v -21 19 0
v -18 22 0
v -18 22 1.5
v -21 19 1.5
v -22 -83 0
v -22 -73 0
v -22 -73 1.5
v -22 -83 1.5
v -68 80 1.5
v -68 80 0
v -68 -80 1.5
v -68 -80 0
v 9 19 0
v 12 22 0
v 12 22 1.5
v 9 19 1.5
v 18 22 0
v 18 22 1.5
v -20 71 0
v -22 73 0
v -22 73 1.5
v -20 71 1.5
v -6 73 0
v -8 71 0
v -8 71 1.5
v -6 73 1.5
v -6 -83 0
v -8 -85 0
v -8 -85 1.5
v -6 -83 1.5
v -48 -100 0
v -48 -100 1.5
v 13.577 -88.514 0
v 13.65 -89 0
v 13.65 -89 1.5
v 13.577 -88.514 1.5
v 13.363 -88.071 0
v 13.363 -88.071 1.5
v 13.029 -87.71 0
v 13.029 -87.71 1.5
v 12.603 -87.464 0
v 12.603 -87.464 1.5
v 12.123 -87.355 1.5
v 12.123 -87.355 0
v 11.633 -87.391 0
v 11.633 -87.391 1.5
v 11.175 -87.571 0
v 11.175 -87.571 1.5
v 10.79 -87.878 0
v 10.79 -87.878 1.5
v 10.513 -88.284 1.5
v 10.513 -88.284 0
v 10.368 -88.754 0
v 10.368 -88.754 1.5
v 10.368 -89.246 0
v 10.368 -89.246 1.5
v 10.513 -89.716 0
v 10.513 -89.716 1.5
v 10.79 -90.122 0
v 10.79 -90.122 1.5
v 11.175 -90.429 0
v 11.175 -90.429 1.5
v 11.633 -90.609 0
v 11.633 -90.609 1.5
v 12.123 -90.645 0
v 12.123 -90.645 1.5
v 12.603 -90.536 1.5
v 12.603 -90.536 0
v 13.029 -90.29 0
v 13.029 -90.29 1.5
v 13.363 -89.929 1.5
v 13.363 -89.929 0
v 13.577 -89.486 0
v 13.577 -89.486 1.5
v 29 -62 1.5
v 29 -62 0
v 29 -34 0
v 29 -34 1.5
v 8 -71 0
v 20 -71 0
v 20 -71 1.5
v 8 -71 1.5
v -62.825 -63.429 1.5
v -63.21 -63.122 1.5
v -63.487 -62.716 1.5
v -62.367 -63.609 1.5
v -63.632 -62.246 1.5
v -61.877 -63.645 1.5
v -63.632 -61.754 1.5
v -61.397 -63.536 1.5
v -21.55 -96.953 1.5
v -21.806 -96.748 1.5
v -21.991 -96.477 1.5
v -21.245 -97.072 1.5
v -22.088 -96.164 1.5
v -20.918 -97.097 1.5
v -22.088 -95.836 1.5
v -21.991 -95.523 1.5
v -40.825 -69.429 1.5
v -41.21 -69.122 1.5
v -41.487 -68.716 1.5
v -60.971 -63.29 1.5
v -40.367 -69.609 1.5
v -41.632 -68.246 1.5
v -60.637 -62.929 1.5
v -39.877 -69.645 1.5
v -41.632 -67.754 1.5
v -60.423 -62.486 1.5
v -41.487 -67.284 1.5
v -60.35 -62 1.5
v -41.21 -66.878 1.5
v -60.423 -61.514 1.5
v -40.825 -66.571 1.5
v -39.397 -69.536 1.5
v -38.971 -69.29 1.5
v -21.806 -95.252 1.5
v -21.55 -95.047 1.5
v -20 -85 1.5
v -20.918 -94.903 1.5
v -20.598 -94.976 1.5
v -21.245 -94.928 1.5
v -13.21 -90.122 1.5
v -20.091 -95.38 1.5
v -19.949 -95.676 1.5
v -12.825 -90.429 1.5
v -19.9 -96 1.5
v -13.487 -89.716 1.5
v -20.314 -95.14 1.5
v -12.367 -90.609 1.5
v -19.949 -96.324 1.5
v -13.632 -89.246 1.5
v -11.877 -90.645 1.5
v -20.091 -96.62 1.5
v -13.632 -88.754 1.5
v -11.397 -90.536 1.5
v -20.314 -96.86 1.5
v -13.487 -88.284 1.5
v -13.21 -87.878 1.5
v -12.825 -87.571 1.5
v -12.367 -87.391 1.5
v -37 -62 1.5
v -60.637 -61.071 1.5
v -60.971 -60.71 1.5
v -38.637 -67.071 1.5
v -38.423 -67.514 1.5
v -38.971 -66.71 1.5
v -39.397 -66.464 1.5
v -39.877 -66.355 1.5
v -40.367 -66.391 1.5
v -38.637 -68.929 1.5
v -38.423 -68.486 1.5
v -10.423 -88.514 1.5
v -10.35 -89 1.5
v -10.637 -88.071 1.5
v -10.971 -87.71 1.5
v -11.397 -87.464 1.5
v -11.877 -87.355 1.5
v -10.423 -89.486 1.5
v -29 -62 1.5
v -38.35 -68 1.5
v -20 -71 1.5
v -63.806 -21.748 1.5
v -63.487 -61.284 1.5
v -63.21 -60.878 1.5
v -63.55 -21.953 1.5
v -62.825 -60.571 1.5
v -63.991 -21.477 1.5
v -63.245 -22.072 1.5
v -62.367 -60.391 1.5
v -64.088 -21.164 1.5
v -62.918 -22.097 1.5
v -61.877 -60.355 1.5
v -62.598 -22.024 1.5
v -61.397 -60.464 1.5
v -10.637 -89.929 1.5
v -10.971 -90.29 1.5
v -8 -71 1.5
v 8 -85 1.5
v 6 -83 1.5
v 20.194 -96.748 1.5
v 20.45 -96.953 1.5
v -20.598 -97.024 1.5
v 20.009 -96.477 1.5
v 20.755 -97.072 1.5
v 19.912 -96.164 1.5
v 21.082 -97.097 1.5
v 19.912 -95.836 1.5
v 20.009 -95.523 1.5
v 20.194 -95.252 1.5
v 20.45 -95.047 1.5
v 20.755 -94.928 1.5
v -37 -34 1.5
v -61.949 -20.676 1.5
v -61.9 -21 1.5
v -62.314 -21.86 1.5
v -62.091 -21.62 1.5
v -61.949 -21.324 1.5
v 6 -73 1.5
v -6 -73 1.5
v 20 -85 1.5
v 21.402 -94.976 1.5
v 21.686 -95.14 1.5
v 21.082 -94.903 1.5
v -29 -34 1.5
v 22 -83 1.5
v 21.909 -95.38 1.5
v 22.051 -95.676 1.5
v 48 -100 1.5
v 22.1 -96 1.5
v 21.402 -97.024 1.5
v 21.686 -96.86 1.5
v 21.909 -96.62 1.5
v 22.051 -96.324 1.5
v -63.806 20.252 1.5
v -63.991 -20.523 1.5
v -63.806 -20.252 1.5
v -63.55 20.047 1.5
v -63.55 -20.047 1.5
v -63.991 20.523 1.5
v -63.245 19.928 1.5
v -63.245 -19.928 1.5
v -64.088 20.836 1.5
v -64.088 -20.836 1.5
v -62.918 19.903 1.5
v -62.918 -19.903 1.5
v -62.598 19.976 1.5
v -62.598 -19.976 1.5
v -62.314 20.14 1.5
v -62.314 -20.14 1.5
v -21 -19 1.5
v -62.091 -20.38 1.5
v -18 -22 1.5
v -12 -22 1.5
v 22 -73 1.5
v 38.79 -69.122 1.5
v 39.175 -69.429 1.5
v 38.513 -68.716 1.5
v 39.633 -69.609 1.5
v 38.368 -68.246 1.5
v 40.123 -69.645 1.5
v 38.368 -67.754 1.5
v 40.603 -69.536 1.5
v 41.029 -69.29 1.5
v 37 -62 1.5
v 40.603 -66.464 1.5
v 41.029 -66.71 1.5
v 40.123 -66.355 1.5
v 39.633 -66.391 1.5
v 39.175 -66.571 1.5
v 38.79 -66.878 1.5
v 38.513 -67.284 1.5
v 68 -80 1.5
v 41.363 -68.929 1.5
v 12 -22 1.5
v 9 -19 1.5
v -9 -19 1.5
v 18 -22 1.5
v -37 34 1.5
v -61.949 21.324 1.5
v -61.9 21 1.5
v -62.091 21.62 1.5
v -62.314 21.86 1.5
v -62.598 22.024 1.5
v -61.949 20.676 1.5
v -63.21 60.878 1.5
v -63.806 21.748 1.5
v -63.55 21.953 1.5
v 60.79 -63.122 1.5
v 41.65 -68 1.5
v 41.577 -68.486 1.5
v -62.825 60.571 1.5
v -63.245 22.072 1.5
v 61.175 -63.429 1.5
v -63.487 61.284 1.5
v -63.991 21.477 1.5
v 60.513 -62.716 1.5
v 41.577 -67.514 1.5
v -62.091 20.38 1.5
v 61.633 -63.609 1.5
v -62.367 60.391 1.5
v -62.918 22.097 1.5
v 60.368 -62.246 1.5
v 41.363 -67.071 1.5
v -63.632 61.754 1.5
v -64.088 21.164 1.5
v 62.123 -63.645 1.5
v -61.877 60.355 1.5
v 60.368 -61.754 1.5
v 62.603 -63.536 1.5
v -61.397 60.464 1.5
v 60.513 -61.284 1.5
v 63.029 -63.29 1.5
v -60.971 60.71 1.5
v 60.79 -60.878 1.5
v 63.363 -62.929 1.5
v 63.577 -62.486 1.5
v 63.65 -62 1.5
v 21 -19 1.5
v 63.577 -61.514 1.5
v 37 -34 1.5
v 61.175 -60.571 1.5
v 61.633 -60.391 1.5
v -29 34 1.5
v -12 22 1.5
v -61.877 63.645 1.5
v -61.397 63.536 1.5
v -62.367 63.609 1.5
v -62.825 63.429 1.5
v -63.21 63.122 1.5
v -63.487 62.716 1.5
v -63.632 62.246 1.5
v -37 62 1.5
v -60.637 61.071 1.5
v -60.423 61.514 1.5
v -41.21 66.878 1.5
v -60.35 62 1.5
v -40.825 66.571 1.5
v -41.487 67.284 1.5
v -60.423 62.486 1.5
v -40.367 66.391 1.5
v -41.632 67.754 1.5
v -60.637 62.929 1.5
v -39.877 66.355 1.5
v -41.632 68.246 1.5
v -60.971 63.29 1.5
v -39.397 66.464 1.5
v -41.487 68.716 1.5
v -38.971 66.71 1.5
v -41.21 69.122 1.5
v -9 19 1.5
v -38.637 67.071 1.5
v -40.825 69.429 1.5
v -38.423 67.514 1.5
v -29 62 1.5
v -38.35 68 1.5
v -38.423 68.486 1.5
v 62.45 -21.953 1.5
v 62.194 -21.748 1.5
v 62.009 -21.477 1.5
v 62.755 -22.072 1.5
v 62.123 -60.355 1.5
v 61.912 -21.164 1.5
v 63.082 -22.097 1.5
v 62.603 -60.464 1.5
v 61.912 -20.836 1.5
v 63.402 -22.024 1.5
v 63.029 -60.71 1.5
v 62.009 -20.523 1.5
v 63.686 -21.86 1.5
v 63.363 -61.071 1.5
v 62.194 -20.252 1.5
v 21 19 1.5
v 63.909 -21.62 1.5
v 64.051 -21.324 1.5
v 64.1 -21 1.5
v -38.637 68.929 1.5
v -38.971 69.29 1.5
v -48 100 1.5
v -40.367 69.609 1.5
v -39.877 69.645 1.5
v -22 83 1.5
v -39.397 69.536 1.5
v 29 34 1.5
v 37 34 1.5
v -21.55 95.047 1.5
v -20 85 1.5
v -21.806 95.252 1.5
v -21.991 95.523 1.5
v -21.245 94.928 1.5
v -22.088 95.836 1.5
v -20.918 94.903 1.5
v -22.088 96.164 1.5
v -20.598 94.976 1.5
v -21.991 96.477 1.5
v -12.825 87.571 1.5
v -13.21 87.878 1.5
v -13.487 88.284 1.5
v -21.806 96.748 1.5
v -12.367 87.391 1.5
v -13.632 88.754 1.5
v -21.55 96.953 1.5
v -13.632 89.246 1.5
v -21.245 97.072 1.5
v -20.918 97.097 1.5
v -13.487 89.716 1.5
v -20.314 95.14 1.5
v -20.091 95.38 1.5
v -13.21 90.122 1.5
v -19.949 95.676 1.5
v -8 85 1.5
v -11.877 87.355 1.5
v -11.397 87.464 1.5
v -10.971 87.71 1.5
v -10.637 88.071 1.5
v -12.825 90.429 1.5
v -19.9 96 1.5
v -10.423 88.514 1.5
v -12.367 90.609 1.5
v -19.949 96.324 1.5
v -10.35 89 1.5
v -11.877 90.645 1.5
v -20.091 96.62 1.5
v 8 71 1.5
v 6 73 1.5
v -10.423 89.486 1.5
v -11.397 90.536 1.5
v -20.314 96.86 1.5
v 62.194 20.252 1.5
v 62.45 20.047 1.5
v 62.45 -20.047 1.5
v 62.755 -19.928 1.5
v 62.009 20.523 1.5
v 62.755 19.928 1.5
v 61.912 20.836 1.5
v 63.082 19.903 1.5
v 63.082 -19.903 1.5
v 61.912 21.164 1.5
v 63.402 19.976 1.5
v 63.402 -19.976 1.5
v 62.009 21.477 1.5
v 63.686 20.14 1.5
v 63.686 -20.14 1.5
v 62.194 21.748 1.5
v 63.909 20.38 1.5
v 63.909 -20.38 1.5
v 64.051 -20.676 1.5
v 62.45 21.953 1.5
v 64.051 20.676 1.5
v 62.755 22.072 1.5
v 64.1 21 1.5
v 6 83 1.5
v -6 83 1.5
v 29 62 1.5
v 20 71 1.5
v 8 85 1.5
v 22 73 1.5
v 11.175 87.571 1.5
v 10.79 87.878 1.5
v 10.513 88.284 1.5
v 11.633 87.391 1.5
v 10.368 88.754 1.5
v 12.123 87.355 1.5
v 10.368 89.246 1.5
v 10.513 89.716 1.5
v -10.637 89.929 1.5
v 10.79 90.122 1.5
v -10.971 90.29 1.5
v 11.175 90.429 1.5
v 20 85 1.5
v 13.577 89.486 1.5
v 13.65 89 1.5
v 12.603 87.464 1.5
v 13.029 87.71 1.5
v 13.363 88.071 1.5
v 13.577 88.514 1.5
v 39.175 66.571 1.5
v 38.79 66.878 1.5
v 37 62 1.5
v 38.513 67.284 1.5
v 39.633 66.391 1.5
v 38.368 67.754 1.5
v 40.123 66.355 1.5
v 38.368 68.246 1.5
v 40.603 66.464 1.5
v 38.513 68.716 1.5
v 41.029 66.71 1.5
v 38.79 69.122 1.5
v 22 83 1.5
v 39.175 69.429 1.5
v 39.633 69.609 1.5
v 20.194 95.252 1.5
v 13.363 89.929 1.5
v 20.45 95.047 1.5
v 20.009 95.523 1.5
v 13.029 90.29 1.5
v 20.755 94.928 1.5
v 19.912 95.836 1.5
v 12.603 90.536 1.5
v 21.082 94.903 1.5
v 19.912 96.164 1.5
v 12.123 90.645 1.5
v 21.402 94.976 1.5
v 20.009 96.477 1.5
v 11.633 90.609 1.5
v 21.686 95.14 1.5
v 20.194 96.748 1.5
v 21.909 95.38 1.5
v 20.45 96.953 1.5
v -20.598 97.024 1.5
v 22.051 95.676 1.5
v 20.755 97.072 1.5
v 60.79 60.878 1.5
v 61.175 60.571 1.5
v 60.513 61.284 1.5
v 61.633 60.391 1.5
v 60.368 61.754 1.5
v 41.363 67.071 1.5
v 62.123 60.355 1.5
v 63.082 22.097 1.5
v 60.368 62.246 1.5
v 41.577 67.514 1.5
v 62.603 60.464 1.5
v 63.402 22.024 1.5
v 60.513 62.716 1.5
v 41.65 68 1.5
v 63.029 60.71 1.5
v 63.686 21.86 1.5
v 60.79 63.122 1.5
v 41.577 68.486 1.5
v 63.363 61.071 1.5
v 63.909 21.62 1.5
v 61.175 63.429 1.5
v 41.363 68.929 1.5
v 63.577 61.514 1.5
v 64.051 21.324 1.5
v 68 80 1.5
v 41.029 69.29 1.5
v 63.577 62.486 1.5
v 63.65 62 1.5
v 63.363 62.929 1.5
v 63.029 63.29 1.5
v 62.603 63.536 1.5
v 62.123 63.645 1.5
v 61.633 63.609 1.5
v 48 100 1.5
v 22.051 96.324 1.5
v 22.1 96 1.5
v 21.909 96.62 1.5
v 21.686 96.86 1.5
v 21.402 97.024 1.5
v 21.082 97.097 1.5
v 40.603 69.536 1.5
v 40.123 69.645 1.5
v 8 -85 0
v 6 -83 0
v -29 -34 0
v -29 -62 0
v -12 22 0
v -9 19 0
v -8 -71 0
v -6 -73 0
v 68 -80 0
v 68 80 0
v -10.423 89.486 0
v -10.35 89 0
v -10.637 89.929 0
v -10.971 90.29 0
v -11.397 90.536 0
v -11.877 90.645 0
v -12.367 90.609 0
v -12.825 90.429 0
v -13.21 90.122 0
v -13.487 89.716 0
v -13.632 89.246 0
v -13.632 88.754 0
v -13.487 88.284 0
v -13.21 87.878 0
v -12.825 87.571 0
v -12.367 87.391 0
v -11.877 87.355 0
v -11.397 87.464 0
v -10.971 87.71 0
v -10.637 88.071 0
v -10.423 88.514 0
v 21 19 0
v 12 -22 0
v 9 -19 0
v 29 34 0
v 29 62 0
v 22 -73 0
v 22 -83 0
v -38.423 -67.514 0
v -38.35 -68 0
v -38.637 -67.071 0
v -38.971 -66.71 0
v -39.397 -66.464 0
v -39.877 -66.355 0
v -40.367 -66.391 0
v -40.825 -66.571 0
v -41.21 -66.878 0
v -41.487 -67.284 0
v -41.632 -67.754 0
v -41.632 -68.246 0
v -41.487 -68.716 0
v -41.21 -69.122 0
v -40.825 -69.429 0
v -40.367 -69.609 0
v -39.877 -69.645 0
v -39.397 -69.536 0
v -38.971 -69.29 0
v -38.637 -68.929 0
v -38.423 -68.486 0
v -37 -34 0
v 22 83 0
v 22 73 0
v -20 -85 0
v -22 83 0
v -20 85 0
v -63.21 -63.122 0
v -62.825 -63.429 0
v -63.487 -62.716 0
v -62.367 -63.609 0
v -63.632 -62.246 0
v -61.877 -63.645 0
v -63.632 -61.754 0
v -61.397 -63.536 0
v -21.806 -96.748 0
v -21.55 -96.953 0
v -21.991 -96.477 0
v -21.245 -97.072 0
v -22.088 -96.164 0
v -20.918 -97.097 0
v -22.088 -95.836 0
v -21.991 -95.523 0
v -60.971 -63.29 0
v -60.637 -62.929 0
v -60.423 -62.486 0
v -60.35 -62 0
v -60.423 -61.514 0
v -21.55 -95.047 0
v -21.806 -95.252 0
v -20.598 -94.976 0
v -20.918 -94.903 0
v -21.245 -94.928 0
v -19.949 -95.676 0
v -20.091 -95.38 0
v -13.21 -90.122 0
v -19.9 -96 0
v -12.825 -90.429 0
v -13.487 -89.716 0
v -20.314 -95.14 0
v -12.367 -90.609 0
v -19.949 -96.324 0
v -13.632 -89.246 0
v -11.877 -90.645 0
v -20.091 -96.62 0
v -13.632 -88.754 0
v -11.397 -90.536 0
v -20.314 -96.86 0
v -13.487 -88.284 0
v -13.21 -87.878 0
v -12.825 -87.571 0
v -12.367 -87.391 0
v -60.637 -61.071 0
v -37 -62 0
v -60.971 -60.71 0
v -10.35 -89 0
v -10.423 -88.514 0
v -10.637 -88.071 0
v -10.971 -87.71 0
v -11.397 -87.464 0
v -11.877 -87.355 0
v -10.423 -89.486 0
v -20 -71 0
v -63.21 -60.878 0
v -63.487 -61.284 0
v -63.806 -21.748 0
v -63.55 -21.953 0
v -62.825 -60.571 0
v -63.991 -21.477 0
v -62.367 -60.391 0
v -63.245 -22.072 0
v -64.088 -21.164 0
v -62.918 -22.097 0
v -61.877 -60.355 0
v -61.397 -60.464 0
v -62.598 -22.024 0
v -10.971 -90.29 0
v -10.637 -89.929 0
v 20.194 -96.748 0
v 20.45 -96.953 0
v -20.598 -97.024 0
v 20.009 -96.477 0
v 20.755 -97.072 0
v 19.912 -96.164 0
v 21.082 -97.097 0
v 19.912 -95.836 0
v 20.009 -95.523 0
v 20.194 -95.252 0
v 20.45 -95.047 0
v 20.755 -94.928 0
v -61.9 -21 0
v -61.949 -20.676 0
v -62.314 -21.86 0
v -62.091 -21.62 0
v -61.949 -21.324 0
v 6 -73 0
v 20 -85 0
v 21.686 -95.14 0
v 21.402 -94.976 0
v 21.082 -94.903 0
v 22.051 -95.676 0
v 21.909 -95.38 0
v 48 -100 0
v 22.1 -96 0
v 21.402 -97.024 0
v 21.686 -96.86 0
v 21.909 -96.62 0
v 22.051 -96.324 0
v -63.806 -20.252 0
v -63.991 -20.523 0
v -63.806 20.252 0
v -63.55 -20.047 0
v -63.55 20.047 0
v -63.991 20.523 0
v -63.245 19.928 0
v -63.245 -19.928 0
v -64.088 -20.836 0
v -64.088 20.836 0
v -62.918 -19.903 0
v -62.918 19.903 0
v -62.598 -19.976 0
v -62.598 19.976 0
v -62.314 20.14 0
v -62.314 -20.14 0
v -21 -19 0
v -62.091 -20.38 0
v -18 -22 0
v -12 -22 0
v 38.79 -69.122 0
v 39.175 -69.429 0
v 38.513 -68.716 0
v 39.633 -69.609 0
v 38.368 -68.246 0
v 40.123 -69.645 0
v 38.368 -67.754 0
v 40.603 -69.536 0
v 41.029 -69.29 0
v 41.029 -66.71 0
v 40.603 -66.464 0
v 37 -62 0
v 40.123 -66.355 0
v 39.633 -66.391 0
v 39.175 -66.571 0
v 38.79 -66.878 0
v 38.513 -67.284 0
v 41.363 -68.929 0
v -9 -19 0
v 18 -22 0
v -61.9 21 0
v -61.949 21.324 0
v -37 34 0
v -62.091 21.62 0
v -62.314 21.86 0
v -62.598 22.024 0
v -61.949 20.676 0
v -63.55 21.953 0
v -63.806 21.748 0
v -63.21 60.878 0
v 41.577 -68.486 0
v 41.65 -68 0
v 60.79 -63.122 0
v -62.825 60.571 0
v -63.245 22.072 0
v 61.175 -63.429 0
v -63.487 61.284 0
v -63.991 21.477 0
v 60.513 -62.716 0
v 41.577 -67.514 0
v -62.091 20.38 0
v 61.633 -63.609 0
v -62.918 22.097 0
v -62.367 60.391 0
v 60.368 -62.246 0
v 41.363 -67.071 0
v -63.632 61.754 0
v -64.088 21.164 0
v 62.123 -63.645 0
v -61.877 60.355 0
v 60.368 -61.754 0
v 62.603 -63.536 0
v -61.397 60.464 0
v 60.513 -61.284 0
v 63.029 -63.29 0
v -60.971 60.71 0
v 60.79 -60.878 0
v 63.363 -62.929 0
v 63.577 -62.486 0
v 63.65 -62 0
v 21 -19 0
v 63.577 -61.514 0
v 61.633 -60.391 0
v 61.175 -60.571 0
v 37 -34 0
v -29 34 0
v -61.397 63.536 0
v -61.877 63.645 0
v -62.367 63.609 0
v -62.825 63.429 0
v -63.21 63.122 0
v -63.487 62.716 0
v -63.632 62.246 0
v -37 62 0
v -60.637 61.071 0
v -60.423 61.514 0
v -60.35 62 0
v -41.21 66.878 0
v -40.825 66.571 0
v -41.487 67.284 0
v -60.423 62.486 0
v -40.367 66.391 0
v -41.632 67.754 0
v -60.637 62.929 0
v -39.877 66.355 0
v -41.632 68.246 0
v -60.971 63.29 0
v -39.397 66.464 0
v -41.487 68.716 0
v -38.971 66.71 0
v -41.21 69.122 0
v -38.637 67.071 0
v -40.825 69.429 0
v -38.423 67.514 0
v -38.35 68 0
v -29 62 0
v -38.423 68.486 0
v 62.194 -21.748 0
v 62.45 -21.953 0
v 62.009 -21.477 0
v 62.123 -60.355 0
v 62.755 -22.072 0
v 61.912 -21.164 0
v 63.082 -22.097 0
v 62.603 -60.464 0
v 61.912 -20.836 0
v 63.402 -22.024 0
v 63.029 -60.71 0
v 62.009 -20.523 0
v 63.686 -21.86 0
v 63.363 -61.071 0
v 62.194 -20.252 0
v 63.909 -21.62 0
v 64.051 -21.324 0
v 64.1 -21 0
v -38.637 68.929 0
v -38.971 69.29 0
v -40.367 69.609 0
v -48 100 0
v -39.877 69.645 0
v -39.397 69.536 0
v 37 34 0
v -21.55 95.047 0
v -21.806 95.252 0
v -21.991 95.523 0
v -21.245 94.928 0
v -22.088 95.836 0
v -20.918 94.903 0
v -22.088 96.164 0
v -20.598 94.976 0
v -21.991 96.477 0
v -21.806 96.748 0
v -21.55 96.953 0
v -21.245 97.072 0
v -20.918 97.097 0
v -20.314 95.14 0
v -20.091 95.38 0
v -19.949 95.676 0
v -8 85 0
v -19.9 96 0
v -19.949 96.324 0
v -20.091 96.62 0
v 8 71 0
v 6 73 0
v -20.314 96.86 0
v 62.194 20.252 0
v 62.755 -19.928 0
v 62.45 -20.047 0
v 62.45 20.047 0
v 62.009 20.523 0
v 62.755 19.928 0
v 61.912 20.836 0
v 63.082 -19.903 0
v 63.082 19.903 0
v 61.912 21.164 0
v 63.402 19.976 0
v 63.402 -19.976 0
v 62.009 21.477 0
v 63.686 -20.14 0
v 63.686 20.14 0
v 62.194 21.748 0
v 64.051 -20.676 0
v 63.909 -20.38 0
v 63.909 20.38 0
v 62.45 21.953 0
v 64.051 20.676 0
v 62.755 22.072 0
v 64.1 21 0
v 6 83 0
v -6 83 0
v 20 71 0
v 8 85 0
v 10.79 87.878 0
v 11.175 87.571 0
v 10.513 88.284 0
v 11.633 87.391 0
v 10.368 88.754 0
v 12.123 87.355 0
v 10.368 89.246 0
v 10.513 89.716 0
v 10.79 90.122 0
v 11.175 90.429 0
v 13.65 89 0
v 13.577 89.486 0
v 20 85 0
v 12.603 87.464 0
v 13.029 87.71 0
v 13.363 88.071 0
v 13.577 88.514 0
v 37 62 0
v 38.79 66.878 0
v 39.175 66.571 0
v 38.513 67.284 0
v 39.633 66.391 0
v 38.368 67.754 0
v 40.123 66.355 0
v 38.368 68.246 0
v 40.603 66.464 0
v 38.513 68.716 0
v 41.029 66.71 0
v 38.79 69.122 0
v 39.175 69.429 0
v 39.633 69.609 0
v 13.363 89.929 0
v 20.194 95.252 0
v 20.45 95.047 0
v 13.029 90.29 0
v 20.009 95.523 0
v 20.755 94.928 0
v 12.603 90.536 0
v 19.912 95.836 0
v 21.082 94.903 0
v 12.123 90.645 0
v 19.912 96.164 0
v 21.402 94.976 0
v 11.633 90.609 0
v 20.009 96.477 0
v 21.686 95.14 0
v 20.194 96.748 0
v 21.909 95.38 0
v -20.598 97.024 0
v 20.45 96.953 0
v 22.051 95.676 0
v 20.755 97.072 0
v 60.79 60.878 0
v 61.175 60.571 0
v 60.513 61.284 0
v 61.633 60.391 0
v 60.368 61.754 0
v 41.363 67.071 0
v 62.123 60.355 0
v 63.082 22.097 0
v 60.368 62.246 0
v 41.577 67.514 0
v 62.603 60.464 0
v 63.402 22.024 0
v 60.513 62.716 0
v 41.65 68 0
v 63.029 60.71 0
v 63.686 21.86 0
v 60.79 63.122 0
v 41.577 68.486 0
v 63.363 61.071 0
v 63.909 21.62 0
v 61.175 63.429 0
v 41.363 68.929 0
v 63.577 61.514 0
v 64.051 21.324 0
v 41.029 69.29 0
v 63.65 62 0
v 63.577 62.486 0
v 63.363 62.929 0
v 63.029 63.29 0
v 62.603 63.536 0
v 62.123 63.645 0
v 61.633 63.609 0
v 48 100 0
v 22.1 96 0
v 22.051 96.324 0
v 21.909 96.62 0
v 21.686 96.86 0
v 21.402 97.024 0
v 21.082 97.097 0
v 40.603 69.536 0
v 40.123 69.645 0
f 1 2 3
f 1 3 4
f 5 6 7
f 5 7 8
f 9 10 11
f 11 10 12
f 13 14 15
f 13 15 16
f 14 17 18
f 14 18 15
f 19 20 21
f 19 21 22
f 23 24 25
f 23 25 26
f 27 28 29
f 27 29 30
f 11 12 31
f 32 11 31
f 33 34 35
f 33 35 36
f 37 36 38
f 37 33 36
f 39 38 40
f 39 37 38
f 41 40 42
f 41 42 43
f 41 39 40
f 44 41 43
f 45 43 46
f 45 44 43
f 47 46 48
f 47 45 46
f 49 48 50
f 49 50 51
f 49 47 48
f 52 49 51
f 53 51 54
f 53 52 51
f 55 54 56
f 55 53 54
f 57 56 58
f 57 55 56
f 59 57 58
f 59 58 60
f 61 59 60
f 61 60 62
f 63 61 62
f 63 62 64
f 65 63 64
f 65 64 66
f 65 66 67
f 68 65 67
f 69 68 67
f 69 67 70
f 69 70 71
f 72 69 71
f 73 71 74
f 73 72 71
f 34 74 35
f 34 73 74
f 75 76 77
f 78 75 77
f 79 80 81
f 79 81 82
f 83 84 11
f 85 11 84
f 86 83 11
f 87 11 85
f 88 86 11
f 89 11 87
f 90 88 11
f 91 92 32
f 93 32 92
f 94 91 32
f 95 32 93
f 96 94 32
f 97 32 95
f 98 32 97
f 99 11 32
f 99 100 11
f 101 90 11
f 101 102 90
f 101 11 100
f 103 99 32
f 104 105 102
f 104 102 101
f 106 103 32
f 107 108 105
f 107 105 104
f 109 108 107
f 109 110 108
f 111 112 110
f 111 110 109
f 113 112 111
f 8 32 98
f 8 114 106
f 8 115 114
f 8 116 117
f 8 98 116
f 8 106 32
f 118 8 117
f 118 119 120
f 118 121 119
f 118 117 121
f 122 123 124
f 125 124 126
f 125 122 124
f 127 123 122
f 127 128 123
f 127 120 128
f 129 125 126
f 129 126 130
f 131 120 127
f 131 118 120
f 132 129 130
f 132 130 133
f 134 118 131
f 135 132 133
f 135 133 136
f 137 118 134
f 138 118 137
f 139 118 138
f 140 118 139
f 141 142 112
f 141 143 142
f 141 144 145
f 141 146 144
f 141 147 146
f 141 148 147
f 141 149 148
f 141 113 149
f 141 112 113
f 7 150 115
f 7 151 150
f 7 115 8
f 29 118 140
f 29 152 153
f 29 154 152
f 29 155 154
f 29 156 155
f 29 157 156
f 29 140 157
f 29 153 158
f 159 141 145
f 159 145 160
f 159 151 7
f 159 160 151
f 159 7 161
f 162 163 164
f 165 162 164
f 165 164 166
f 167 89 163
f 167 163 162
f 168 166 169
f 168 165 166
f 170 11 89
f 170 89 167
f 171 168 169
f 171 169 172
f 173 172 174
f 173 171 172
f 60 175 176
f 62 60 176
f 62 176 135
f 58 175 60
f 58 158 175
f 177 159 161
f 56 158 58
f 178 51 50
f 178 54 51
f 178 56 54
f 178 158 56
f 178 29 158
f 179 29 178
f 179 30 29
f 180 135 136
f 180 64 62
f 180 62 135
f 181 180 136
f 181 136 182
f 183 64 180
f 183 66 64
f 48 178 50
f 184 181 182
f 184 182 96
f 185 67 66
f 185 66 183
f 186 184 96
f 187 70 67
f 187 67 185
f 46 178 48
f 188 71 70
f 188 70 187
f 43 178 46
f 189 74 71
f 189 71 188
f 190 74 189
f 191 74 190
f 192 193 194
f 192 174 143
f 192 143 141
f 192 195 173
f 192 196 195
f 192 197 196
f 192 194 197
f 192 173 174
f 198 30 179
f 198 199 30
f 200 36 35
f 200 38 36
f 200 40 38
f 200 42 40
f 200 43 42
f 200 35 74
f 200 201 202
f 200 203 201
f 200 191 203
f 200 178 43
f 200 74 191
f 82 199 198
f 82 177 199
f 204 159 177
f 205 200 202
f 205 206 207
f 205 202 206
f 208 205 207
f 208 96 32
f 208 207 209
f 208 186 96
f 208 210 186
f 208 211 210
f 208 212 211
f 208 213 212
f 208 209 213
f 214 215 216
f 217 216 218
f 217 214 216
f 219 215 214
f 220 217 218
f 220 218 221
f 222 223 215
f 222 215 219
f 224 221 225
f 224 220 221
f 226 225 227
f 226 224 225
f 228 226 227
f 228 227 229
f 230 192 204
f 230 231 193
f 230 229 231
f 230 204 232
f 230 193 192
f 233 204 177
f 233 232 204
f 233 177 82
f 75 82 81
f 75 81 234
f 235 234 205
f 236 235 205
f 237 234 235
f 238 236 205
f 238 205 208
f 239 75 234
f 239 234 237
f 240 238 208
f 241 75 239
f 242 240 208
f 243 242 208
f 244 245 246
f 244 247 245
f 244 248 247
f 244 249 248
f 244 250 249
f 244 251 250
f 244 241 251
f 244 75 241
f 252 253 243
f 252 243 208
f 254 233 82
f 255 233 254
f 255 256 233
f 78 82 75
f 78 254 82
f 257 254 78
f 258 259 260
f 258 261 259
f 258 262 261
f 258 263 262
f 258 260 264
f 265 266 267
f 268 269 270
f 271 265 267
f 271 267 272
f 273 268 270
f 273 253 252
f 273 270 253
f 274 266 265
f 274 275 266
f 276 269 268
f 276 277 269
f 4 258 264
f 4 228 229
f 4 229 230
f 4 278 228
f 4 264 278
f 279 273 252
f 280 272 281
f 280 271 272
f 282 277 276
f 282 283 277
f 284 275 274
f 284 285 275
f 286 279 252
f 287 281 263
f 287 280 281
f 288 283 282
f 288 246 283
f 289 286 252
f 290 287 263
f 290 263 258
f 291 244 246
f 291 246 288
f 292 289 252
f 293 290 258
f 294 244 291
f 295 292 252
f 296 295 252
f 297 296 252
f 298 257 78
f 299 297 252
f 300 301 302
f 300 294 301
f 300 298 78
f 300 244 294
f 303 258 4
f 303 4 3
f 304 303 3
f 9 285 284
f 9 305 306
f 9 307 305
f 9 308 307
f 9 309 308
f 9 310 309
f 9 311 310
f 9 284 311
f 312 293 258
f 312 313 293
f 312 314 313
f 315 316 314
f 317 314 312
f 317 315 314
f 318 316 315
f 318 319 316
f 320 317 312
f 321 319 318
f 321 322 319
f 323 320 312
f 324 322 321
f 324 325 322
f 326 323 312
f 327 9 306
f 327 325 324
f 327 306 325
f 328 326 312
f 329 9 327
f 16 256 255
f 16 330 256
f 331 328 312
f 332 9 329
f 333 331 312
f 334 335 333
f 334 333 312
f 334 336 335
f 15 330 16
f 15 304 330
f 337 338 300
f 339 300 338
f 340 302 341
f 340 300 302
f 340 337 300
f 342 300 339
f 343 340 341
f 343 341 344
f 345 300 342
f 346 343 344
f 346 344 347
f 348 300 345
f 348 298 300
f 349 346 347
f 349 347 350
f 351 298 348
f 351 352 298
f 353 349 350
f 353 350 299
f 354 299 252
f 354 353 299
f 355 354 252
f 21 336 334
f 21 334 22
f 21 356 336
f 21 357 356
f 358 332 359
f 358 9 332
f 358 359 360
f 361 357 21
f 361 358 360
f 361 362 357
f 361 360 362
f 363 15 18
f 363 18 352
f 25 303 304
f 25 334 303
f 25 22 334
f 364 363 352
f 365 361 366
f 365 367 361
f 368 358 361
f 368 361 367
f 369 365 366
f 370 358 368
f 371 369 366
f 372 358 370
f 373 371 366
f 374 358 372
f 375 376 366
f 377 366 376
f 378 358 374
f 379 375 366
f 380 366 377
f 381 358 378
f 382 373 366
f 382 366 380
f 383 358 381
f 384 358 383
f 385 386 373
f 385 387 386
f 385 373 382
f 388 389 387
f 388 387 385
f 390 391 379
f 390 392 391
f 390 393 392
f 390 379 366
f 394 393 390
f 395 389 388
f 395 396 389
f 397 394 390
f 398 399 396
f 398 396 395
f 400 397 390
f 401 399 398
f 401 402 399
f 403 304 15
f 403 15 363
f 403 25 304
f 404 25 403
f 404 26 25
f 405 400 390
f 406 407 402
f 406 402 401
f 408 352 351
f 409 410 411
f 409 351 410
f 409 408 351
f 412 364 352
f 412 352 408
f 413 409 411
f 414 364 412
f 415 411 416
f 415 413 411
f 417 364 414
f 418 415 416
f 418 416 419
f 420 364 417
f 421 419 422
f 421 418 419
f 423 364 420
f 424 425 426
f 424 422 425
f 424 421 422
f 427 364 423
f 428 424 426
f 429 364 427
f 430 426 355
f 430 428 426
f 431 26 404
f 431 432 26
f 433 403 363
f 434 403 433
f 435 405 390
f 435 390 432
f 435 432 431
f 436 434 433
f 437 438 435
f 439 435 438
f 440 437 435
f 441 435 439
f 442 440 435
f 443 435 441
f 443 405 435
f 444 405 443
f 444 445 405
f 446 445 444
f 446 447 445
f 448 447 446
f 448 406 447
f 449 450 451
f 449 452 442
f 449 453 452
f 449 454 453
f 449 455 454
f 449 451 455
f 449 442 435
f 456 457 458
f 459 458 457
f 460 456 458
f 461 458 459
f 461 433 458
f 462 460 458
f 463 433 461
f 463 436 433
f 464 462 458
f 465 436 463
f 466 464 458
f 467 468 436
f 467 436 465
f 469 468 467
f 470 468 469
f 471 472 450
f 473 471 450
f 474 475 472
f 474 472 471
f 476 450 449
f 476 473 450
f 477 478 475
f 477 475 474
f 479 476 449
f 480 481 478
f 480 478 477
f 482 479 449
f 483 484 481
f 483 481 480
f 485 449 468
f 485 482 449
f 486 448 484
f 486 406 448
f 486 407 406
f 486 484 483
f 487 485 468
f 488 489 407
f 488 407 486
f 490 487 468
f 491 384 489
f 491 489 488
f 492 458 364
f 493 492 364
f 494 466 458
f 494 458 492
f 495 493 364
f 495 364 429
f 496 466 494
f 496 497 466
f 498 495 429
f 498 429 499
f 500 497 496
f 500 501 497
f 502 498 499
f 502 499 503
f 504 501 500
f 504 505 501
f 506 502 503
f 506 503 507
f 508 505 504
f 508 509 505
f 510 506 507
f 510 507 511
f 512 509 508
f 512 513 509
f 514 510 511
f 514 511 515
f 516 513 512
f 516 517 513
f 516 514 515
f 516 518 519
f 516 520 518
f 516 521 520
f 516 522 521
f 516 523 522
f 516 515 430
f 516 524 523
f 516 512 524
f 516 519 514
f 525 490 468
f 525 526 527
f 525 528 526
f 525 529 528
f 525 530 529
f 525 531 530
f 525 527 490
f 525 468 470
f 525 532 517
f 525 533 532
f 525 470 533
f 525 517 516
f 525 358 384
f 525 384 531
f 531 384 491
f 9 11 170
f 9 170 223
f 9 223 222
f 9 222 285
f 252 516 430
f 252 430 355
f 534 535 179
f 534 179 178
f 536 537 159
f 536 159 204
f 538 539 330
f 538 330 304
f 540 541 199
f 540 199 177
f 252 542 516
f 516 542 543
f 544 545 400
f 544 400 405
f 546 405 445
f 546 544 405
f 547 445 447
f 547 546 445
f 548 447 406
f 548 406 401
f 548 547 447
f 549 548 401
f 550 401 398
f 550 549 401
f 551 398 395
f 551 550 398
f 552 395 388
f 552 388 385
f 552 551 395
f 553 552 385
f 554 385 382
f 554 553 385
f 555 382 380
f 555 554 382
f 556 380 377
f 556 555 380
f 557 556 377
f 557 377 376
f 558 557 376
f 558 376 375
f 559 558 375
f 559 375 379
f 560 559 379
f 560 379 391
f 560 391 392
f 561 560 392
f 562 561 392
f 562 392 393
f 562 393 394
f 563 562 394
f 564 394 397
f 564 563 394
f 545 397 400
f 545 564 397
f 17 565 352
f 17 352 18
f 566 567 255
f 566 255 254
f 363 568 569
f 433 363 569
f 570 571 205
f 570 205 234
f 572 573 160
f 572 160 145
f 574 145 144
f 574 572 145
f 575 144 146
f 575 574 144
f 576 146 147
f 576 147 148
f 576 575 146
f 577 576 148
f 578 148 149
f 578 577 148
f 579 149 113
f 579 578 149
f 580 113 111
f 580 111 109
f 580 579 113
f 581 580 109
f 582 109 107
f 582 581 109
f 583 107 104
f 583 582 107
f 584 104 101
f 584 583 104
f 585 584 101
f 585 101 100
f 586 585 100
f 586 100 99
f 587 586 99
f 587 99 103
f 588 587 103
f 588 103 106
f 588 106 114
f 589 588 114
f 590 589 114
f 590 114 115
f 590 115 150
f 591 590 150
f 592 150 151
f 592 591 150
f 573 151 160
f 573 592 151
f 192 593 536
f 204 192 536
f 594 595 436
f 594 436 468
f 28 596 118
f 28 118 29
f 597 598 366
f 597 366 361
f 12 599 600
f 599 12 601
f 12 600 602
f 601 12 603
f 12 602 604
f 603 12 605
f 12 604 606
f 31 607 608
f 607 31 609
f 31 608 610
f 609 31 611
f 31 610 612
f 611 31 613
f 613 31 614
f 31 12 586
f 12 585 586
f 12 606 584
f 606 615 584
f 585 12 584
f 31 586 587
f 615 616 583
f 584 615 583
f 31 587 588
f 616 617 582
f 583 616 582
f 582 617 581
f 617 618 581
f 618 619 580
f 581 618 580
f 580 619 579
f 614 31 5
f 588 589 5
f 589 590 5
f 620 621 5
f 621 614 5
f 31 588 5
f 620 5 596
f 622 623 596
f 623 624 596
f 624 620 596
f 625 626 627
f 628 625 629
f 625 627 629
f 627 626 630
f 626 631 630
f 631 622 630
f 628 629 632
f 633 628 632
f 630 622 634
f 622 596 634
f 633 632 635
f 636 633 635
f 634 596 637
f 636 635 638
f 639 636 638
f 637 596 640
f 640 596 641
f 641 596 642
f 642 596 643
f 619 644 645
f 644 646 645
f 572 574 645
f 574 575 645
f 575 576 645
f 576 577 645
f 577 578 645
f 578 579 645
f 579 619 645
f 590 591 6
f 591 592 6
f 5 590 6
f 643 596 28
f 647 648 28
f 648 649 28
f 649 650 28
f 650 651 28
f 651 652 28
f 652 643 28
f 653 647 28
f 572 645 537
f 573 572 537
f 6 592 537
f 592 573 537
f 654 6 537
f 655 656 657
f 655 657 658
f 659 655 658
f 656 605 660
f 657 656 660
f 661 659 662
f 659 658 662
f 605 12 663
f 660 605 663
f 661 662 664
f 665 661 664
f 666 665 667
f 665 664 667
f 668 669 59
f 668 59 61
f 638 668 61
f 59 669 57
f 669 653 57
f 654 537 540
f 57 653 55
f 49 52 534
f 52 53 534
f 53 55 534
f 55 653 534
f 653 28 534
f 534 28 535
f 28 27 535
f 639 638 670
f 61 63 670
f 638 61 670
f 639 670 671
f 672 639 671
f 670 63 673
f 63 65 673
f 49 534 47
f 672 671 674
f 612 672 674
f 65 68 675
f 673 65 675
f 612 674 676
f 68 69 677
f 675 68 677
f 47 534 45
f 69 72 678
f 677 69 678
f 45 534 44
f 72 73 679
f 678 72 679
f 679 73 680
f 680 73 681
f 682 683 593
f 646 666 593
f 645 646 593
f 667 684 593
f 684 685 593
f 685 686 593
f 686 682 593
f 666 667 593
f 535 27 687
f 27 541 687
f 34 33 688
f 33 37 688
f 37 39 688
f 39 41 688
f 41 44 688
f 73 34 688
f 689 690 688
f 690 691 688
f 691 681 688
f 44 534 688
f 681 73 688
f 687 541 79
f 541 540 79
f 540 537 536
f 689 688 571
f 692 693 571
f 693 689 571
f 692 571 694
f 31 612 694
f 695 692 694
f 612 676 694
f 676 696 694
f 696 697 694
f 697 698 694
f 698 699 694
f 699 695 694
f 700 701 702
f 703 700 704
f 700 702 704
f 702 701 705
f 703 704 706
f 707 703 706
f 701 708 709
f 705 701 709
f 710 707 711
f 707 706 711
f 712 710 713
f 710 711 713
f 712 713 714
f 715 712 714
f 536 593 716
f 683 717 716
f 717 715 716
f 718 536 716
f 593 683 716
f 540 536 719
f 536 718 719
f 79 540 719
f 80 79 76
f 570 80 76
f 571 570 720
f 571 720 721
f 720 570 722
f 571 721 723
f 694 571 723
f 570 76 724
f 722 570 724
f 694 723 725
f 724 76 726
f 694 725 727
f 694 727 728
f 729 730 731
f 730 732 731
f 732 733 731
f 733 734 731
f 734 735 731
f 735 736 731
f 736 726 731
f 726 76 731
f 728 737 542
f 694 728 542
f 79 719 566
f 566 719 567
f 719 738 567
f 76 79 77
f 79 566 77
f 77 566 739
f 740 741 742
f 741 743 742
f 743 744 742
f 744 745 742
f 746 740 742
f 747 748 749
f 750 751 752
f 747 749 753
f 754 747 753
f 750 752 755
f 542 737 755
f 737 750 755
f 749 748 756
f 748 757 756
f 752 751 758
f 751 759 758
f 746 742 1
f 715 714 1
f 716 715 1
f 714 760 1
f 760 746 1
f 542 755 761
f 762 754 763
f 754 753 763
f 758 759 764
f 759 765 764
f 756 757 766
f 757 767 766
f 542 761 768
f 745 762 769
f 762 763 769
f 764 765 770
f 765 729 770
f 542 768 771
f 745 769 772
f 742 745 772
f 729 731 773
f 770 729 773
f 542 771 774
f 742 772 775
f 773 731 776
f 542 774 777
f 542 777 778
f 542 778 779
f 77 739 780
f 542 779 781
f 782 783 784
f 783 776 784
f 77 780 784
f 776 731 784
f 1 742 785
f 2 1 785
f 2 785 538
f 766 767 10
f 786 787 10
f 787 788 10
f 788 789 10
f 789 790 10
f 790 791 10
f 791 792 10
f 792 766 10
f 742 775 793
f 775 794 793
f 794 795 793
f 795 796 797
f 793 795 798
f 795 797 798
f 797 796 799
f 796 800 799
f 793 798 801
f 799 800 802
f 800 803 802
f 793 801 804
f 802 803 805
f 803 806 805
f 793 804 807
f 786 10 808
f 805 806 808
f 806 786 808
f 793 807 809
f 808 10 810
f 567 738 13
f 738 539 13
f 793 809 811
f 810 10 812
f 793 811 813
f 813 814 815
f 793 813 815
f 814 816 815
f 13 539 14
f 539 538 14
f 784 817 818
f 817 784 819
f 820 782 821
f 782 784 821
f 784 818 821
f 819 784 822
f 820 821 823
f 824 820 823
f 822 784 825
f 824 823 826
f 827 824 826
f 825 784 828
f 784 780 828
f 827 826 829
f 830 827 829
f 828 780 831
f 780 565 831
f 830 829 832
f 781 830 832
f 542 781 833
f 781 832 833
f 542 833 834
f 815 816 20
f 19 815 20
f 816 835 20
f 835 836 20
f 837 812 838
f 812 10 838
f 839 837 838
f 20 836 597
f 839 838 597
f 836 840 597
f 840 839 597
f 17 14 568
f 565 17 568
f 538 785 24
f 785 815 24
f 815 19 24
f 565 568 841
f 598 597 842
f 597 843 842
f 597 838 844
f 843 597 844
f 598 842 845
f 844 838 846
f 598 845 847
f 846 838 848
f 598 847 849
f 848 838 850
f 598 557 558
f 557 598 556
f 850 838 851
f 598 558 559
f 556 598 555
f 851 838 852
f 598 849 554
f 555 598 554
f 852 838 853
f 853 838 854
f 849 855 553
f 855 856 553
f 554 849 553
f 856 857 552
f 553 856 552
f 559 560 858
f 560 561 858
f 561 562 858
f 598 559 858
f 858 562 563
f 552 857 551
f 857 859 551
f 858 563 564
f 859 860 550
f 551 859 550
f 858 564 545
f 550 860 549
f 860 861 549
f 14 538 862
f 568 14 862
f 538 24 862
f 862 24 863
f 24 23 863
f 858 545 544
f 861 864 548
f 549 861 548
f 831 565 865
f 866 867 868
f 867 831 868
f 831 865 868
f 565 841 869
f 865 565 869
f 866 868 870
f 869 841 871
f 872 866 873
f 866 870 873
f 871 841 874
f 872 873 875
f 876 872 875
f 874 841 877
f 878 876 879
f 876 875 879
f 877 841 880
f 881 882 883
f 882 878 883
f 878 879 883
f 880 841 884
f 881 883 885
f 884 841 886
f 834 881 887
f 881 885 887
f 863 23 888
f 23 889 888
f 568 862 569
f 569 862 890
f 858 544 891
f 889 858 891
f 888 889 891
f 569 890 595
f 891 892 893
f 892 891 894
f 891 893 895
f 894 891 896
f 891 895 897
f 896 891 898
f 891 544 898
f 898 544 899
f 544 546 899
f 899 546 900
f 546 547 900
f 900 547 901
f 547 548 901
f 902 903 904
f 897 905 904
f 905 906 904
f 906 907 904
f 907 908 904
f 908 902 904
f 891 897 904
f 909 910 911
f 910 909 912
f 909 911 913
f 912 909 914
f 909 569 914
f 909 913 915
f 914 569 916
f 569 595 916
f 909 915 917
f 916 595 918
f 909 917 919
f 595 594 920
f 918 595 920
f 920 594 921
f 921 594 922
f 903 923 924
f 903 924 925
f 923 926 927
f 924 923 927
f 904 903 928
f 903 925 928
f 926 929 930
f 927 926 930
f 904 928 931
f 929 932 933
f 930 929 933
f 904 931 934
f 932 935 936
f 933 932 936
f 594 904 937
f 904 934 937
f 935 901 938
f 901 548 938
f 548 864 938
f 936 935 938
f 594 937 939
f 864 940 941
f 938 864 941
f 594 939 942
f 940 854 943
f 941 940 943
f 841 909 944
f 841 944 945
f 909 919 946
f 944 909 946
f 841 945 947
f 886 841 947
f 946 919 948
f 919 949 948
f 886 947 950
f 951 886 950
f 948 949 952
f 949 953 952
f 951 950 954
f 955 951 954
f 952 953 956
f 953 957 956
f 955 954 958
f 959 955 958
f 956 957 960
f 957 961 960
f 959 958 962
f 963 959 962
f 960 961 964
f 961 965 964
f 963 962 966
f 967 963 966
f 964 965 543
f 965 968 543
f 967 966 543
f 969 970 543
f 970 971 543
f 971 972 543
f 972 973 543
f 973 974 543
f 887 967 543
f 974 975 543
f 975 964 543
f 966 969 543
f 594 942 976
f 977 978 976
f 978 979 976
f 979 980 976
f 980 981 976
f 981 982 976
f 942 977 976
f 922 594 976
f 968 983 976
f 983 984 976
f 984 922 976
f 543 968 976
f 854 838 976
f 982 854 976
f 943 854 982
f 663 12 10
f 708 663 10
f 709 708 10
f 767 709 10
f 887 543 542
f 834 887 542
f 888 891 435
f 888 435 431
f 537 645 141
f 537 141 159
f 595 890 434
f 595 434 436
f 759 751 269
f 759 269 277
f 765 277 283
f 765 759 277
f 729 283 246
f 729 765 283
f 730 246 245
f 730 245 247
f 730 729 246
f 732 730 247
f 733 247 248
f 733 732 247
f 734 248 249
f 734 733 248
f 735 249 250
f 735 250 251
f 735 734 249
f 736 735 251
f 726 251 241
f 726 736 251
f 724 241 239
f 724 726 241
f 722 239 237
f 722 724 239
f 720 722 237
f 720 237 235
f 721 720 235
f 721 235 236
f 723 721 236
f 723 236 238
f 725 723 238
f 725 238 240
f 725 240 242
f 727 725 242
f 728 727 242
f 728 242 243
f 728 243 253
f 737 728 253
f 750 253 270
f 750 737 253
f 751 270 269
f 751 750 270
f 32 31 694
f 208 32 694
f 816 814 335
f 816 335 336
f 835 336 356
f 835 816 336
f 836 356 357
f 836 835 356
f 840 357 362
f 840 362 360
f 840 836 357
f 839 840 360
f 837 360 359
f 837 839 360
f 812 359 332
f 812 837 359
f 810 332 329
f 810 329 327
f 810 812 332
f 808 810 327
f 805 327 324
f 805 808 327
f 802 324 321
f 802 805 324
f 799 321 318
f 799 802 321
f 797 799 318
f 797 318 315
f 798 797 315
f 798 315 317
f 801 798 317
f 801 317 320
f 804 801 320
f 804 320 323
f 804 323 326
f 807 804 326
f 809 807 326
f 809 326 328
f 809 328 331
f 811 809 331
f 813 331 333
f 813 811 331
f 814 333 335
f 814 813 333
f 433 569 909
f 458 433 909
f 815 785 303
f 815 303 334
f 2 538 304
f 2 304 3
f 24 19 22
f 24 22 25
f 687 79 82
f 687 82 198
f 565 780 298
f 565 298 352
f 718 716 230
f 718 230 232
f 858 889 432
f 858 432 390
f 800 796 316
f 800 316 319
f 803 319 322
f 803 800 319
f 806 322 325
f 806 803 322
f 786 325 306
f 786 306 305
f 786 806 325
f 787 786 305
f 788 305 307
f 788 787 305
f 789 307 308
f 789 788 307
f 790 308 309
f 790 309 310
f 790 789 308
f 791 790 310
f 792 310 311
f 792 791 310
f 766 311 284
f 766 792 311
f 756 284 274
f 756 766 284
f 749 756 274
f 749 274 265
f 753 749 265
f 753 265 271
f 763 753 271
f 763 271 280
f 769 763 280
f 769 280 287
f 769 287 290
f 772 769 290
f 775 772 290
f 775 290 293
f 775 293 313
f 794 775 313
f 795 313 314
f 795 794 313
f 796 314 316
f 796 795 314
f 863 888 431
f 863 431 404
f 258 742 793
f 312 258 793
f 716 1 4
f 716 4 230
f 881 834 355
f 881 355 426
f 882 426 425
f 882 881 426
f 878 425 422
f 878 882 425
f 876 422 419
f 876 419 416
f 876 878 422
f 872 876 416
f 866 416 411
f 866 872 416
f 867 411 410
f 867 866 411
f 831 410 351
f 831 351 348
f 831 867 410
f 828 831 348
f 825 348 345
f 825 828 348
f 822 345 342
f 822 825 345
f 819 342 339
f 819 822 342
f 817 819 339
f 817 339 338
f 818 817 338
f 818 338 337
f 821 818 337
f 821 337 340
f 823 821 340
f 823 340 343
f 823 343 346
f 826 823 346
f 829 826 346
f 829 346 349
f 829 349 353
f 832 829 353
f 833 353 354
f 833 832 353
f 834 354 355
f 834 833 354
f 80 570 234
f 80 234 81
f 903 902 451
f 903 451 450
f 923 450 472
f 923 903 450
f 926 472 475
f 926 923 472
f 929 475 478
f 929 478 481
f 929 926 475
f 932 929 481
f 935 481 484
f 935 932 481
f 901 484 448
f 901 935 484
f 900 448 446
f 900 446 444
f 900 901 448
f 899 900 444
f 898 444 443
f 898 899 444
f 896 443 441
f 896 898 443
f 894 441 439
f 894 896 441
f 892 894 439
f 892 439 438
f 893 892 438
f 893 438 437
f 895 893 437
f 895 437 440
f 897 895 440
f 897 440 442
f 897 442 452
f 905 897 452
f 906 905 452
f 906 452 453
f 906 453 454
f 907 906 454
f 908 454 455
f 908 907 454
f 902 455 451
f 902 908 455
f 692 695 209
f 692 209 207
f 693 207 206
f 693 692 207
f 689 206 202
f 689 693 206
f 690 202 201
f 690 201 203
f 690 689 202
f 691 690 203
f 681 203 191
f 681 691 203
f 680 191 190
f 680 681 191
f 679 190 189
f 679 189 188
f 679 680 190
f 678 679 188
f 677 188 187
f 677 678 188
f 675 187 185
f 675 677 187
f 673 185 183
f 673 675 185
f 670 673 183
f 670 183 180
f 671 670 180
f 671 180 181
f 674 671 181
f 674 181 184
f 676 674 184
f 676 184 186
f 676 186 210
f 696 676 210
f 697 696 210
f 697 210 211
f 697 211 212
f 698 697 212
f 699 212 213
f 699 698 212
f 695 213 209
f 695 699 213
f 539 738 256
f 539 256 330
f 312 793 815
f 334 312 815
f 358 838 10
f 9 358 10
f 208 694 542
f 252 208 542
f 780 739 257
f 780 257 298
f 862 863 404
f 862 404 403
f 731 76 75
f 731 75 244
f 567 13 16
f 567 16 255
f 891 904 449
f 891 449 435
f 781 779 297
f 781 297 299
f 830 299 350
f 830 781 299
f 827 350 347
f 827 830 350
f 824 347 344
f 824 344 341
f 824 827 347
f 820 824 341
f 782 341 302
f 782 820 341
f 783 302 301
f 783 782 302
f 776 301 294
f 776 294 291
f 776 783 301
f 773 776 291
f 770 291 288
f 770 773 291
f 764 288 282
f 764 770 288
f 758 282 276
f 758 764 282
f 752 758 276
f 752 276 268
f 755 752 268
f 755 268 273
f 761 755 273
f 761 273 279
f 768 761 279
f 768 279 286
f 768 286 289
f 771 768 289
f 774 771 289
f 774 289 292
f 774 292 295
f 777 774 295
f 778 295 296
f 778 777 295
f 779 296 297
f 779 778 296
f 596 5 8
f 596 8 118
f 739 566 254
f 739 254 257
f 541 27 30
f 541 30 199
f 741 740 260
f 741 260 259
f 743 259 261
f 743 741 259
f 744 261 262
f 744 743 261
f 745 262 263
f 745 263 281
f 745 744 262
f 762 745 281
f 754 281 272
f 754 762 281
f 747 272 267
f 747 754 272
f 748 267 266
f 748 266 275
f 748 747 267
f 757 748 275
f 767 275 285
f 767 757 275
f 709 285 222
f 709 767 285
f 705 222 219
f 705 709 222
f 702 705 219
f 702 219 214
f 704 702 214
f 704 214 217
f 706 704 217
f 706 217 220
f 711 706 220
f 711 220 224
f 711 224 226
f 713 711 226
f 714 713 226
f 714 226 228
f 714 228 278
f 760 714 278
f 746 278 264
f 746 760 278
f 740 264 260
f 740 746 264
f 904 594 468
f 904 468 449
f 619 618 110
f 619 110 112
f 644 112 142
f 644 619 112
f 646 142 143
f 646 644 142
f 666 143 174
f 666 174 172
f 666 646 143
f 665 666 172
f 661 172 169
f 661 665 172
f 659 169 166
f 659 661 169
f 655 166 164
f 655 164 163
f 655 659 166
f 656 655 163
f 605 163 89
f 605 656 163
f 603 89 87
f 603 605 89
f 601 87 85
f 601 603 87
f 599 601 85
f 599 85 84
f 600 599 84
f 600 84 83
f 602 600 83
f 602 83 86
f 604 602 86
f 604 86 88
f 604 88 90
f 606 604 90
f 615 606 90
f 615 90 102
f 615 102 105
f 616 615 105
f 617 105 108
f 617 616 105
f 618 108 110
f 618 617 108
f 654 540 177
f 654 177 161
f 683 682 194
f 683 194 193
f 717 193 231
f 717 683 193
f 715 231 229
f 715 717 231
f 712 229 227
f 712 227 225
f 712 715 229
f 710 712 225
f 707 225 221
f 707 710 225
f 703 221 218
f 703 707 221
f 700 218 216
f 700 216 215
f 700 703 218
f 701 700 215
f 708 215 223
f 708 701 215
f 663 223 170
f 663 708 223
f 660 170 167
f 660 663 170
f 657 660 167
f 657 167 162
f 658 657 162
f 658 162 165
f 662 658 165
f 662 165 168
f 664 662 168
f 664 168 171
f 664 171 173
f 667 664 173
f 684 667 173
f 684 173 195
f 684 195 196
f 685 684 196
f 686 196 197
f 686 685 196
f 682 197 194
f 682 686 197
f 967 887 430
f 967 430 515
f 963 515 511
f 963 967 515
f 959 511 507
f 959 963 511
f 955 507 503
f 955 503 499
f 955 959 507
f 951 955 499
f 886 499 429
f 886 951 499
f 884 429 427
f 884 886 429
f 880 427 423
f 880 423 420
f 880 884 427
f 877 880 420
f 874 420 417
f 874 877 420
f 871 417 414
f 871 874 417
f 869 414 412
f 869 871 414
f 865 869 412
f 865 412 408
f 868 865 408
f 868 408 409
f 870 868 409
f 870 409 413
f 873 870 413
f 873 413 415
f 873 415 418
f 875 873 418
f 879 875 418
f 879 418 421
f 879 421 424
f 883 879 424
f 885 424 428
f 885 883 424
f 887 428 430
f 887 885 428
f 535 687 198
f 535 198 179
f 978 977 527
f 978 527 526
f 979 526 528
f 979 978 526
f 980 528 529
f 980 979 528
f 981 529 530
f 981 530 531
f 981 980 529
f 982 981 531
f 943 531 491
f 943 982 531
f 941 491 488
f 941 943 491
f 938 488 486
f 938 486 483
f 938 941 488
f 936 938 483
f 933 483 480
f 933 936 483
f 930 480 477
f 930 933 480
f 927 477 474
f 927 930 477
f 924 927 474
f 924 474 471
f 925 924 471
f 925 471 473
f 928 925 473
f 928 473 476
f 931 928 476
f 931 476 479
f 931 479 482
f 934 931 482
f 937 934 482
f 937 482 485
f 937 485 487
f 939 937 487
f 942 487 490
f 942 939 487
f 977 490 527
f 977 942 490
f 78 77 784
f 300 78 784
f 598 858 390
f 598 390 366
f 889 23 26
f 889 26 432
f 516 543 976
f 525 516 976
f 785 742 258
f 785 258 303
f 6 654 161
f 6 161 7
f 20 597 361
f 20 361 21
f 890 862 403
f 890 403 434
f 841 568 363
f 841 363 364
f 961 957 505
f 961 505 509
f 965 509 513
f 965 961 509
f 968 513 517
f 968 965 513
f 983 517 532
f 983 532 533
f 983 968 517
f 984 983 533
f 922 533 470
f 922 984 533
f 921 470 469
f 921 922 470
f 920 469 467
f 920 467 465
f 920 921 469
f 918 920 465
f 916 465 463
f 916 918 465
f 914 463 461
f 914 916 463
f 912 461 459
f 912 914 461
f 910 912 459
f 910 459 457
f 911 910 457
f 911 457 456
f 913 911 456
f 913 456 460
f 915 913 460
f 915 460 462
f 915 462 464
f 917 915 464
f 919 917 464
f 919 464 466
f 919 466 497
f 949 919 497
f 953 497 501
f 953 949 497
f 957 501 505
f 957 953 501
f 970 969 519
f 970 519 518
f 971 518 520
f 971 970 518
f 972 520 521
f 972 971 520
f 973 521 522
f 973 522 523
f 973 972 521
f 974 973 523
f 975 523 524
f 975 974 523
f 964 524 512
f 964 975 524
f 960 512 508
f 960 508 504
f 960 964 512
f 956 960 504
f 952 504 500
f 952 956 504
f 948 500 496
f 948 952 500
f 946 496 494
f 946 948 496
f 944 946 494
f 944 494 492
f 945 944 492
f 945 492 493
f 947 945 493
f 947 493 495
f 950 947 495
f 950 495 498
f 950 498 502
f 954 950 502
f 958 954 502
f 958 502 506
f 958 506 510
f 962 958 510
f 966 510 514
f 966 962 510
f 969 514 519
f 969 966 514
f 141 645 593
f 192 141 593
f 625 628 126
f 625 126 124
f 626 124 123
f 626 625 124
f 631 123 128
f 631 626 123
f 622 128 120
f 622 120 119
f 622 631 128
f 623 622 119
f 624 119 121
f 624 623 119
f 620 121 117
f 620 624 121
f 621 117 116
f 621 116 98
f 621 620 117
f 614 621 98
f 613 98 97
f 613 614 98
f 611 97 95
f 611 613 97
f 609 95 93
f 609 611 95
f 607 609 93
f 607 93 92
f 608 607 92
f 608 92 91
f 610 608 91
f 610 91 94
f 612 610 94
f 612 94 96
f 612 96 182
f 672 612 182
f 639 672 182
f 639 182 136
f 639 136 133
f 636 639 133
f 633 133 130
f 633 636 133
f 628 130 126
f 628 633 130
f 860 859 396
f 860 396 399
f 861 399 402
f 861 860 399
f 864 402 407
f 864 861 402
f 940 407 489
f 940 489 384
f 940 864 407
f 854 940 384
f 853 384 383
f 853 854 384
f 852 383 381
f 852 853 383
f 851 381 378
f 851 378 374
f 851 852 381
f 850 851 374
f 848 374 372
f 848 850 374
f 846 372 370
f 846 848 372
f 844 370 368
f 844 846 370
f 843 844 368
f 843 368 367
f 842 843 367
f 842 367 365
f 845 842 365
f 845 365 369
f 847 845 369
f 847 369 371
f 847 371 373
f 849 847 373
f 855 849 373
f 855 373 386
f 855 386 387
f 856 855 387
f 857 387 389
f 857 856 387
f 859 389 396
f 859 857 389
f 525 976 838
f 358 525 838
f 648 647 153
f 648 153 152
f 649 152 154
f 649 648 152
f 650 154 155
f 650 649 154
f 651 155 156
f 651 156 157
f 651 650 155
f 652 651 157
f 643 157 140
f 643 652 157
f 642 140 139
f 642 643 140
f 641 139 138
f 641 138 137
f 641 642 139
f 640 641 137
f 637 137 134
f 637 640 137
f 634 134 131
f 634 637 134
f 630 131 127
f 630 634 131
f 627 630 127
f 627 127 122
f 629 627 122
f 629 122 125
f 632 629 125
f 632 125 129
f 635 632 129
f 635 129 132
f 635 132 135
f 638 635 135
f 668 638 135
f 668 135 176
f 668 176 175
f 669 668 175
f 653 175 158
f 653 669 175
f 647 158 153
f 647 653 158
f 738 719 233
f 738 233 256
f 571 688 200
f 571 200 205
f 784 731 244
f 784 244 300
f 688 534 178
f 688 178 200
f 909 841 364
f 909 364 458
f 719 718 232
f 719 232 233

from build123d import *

# Parameters (mm, degrees)
SKETCH_1_R            = 1.65
SKETCH_1_W            = 8
SKETCH_1_H            = 28
EXTRUDE_401_DEPTH     = 1.5
SKETCH_3_R            = 1.1
CUT_EXTRUDE_482_DEPTH = 1.5


with BuildPart() as part:
    # 草图1 → Extrude 401 (new body)
    with BuildSketch(Plane.XY):
        Polygon((68, 80), (48, 100), (-48, 100), (-68, 80), (-68, -80), (-48, -100), (48, -100), (68, -80), align=None)
        with Locations((-62, -62)):
            Circle(SKETCH_1_R, mode=Mode.SUBTRACT)
        with Locations((-40, -68)):
            Circle(SKETCH_1_R, mode=Mode.SUBTRACT)
        with Locations((-12, -89)):
            Circle(SKETCH_1_R, mode=Mode.SUBTRACT)
        with Locations((-62, 62)):
            Circle(SKETCH_1_R, mode=Mode.SUBTRACT)
        with Locations((-40, 68)):
            Circle(SKETCH_1_R, mode=Mode.SUBTRACT)
        with Locations((-12, 89)):
            Circle(SKETCH_1_R, mode=Mode.SUBTRACT)
        with Locations((62, -62)):
            Circle(SKETCH_1_R, mode=Mode.SUBTRACT)
        with Locations((40, -68)):
            Circle(SKETCH_1_R, mode=Mode.SUBTRACT)
        with Locations((12, -89)):
            Circle(SKETCH_1_R, mode=Mode.SUBTRACT)
        with Locations((62, 62)):
            Circle(SKETCH_1_R, mode=Mode.SUBTRACT)
        with Locations((40, 68)):
            Circle(SKETCH_1_R, mode=Mode.SUBTRACT)
        with Locations((12, 89)):
            Circle(SKETCH_1_R, mode=Mode.SUBTRACT)
        with Locations((-33, -48)):
            Rectangle(SKETCH_1_W, SKETCH_1_H, mode=Mode.SUBTRACT)
        Polygon((-20, -85), (-8, -85), (-6, -83), (-6, -73), (-8, -71), (-20, -71), (-22, -73), (-22, -83), align=None, mode=Mode.SUBTRACT)
        with Locations((-33, 48)):
            Rectangle(SKETCH_1_W, SKETCH_1_H, mode=Mode.SUBTRACT)
        Polygon((-20, 71), (-8, 71), (-6, 73), (-6, 83), (-8, 85), (-20, 85), (-22, 83), (-22, 73), align=None, mode=Mode.SUBTRACT)
        with Locations((33, -48)):
            Rectangle(SKETCH_1_W, SKETCH_1_H, mode=Mode.SUBTRACT)
        Polygon((8, -85), (20, -85), (22, -83), (22, -73), (20, -71), (8, -71), (6, -73), (6, -83), align=None, mode=Mode.SUBTRACT)
        with Locations((33, 48)):
            Rectangle(SKETCH_1_W, SKETCH_1_H, mode=Mode.SUBTRACT)
        Polygon((8, 71), (20, 71), (22, 73), (22, 83), (20, 85), (8, 85), (6, 83), (6, 73), align=None, mode=Mode.SUBTRACT)
        Polygon((-18, -22), (-12, -22), (-9, -19), (-9, 19), (-12, 22), (-18, 22), (-21, 19), (-21, -19), align=None, mode=Mode.SUBTRACT)
        Polygon((12, -22), (18, -22), (21, -19), (21, 19), (18, 22), (12, 22), (9, 19), (9, -19), align=None, mode=Mode.SUBTRACT)
    extrude(amount=EXTRUDE_401_DEPTH)

    # 草图3 → Cut-Extrude 482 (cut)
    with BuildSketch(Plane.XY):
        with Locations((-63, -21)):
            Circle(SKETCH_3_R)
        with Locations((-21, -96)):
            Circle(SKETCH_3_R)
        with Locations((-63, 21)):
            Circle(SKETCH_3_R)
        with Locations((-21, 96)):
            Circle(SKETCH_3_R)
        with Locations((63, -21)):
            Circle(SKETCH_3_R)
        with Locations((21, -96)):
            Circle(SKETCH_3_R)
        with Locations((63, 21)):
            Circle(SKETCH_3_R)
        with Locations((21, 96)):
            Circle(SKETCH_3_R)
    extrude(amount=CUT_EXTRUDE_482_DEPTH, mode=Mode.SUBTRACT)


solid = part.part
